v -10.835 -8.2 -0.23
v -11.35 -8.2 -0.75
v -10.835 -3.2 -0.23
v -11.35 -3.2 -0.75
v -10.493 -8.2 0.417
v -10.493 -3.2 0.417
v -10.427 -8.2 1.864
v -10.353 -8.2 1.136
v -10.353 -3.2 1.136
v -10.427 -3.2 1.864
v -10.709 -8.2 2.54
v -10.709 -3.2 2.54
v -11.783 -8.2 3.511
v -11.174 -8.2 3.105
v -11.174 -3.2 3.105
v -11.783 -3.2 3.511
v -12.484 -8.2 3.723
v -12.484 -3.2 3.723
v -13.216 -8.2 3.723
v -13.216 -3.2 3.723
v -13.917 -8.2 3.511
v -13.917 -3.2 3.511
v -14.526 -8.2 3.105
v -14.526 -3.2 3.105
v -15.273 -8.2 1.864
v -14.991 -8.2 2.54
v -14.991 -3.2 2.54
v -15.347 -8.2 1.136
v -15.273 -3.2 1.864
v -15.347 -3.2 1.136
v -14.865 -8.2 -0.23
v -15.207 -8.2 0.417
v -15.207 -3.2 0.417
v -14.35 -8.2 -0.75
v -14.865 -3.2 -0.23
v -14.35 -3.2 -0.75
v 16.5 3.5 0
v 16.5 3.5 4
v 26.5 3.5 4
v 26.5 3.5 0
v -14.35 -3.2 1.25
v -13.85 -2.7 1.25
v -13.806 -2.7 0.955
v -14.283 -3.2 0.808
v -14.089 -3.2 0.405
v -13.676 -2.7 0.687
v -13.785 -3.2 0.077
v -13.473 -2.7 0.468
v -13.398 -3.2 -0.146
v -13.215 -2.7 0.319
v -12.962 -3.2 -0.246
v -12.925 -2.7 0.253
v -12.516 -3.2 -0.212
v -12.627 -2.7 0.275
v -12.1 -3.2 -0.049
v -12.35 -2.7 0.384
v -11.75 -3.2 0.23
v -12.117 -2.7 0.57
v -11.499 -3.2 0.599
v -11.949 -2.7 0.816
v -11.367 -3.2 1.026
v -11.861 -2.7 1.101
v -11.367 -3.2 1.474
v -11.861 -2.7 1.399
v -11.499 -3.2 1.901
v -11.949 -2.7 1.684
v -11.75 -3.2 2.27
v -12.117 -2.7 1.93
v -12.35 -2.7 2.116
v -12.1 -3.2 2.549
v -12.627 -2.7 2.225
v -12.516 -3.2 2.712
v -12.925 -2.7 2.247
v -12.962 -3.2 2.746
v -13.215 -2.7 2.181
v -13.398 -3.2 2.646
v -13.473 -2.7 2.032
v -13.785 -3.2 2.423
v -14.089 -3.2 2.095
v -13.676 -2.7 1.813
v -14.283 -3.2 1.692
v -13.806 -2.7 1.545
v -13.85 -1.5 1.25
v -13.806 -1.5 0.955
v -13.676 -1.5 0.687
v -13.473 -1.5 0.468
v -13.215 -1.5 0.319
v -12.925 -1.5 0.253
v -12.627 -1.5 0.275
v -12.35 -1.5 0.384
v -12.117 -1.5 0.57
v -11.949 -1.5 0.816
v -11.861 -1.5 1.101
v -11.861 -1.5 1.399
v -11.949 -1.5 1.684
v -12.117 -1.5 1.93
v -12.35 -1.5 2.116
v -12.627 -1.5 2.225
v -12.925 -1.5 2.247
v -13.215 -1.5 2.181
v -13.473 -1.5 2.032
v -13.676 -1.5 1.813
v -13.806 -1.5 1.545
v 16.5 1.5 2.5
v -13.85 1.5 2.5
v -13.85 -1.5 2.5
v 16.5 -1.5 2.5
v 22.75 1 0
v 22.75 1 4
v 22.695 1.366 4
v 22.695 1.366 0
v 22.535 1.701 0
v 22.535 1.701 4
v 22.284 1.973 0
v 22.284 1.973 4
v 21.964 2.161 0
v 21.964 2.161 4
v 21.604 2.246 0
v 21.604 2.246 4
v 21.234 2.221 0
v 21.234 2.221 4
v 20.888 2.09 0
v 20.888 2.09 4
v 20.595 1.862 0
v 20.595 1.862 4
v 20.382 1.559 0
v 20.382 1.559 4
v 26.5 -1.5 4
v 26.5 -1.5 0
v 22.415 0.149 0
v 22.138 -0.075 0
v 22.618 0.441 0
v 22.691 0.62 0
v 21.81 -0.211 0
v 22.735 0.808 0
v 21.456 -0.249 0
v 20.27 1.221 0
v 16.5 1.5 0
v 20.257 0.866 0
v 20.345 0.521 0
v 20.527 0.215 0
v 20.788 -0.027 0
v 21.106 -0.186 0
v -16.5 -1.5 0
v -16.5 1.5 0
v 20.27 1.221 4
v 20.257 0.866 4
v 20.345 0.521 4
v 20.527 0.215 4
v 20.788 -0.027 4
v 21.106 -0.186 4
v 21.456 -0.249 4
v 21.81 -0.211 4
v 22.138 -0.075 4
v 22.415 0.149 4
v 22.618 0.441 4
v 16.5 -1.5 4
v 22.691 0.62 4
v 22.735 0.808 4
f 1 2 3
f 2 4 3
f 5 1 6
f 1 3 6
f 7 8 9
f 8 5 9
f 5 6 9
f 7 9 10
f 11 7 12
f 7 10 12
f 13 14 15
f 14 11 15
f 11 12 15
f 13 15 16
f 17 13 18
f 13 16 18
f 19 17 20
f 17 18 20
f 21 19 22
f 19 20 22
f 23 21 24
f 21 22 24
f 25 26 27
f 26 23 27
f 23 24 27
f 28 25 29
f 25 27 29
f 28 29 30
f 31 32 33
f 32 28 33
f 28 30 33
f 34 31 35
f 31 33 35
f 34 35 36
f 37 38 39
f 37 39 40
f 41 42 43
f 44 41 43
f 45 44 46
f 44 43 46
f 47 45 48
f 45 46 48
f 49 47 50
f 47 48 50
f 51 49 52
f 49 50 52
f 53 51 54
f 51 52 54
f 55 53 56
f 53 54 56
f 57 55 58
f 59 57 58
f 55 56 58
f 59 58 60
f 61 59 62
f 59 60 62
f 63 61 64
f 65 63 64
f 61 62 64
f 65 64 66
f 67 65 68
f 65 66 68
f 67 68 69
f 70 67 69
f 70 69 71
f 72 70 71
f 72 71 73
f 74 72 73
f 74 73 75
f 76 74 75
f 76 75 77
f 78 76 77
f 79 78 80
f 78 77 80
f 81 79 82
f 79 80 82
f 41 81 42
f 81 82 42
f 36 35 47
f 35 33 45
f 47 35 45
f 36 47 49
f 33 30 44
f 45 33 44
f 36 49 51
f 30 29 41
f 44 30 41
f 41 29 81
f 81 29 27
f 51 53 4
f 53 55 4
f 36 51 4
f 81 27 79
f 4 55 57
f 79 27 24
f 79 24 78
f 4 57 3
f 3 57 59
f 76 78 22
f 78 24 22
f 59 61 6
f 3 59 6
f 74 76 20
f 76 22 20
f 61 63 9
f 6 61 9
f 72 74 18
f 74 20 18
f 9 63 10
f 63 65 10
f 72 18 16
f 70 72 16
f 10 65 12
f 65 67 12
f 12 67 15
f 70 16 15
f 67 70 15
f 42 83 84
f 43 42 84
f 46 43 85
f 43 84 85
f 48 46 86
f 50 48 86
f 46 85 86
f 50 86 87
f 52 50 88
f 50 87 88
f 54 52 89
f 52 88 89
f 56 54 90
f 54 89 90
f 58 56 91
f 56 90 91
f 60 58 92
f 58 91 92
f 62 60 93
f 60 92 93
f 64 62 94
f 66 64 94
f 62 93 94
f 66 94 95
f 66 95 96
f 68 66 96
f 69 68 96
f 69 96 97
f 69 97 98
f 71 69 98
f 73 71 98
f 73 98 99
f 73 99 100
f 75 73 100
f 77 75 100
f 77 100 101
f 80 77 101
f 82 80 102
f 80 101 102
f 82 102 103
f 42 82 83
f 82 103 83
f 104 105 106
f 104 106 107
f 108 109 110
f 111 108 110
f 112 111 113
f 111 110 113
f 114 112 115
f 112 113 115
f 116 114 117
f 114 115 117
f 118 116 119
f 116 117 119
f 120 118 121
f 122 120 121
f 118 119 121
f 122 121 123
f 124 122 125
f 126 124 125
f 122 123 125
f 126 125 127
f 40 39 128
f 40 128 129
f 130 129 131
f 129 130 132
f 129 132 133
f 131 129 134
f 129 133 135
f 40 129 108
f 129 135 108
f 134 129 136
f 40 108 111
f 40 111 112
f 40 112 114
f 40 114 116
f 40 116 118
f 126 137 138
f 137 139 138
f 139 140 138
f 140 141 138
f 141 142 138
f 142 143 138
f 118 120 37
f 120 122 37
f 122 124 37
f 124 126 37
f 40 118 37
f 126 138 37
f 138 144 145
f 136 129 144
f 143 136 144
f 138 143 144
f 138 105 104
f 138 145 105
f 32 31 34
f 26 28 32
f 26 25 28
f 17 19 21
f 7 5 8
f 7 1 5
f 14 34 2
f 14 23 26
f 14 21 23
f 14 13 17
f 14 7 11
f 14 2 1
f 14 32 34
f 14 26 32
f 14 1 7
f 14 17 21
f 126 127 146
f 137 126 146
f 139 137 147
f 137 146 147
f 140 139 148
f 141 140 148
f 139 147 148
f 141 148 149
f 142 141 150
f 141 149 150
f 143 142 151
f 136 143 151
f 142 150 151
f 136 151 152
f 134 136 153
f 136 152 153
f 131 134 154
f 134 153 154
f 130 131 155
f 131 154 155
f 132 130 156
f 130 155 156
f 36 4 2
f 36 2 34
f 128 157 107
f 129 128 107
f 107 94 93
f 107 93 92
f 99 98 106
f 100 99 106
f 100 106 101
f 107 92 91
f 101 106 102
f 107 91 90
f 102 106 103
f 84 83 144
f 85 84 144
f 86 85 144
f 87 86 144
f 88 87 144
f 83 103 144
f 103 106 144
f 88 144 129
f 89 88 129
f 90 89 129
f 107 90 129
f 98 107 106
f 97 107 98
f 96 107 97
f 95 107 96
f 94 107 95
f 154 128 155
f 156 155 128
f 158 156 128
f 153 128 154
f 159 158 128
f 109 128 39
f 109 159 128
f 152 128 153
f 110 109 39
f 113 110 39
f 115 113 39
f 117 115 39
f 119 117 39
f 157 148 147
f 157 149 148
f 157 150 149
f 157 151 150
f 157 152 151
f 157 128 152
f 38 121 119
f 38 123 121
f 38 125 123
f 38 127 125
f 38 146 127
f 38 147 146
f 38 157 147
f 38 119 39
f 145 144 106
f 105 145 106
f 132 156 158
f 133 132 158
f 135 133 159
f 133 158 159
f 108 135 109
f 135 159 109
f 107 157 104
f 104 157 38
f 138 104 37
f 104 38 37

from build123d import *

# Parameters (mm, degrees)
SCHIZZO1_W                   = 33
SCHIZZO1_H                   = 3
ESTRUSIONE_ESTRUSIONE1_DEPTH = 2.5
TAGLIO_ESTRUSIONE1_DEPTH     = 17.955824958
SCHIZZO3_R                   = 1
ESTRUSIONE_ESTRUSIONE2_DEPTH = 1.7
SCHIZZO5_R                   = 2.5
ESTRUSIONE_ESTRUSIONE3_DEPTH = 5
SMUSSO2_SIZE                 = 0.5
SCHIZZO8_W                   = 4
SCHIZZO8_H                   = 5
ESTRUSIONE_ESTRUSIONE6_DEPTH = 10
TAGLIO_ESTRUSIONE3_DEPTH     = 29.232118234
TAGLIO_ESTRUSIONE4_START     = -5
TAGLIO_ESTRUSIONE4_DEPTH     = 5


with BuildPart() as part:
    # Schizzo1 → Estrusione-Estrusione1 (new body)
    with BuildSketch(Plane.XY):
        Rectangle(SCHIZZO1_W, SCHIZZO1_H)
    extrude(amount=ESTRUSIONE_ESTRUSIONE1_DEPTH)

    # Schizzo2 → Taglio-Estrusione1 (cut, through all)
    with BuildSketch(Plane.XZ.offset(1.5)):
        Polygon((-16.5, 0), (-13.85, 2.5), (-16.5, 2.5), align=None)
    extrude(amount=-TAGLIO_ESTRUSIONE1_DEPTH, mode=Mode.SUBTRACT)

    # Schizzo3 → Estrusione-Estrusione2 (add)
    with BuildSketch(Plane.XZ.offset(1.5)):
        with Locations(Location((-12.85, 1.25, 0), (0, 0, 180))):
            Circle(SCHIZZO3_R)
    extrude(amount=ESTRUSIONE_ESTRUSIONE2_DEPTH)

    # Schizzo5 → Estrusione-Estrusione3 (add)
    with BuildSketch(Plane.XZ.offset(3.2)):
        with Locations((-12.85, 1.25)):
            Circle(SCHIZZO5_R)
    extrude(amount=ESTRUSIONE_ESTRUSIONE3_DEPTH)

    # Smusso2
    smusso2_edges = [part.edges().sort_by_distance(p)[0] for p in [
        (-11.85, -3.2, 1.25),
    ]]
    chamfer(smusso2_edges, length=SMUSSO2_SIZE)

    # Schizzo8 → Estrusione-Estrusione6 (add)
    with BuildSketch(Plane(origin=(16.5, 0, 0), x_dir=(0, 0, -1), z_dir=(1, 0, 0))):
        with Locations((-2, 1)):
            Rectangle(SCHIZZO8_W, SCHIZZO8_H)
    extrude(amount=ESTRUSIONE_ESTRUSIONE6_DEPTH)

    # Schizzo9 → Taglio-Estrusione3 (cut, through all)
    with BuildSketch(Plane.XY.offset(4)):
        with BuildLine():
            ThreePointArc((22.75, 1), (21.787191151, 2.216561237), (20.381966011, 1.559016994))
            Line((20.381966011, 1.559016994), (22.618033989, 0.440983006))
            ThreePointArc((22.618033989, 0.440983006), (22.716561237, 0.712808849), (22.75, 1))
        make_face()
        with BuildLine():
            Line((22.618033989, 0.440983006), (20.381966011, 1.559016994))
            ThreePointArc((20.381966011, 1.559016994), (20.940983006, -0.118033989), (22.618033989, 0.440983006))
        make_face()
    extrude(amount=-TAGLIO_ESTRUSIONE3_DEPTH, mode=Mode.SUBTRACT)

    # Schizzo10 → Taglio-Estrusione4 (cut)
    with BuildSketch(Plane.XZ.offset(8.2).offset(TAGLIO_ESTRUSIONE4_START)):
        with BuildLine():
            Line((-11.35, -0.75), (-14.35, -0.75))
            ThreePointArc((-14.35, -0.75), (-12.85, -1.25), (-11.35, -0.75))
        make_face()
    extrude(amount=TAGLIO_ESTRUSIONE4_DEPTH, mode=Mode.SUBTRACT)


solid = part.part
